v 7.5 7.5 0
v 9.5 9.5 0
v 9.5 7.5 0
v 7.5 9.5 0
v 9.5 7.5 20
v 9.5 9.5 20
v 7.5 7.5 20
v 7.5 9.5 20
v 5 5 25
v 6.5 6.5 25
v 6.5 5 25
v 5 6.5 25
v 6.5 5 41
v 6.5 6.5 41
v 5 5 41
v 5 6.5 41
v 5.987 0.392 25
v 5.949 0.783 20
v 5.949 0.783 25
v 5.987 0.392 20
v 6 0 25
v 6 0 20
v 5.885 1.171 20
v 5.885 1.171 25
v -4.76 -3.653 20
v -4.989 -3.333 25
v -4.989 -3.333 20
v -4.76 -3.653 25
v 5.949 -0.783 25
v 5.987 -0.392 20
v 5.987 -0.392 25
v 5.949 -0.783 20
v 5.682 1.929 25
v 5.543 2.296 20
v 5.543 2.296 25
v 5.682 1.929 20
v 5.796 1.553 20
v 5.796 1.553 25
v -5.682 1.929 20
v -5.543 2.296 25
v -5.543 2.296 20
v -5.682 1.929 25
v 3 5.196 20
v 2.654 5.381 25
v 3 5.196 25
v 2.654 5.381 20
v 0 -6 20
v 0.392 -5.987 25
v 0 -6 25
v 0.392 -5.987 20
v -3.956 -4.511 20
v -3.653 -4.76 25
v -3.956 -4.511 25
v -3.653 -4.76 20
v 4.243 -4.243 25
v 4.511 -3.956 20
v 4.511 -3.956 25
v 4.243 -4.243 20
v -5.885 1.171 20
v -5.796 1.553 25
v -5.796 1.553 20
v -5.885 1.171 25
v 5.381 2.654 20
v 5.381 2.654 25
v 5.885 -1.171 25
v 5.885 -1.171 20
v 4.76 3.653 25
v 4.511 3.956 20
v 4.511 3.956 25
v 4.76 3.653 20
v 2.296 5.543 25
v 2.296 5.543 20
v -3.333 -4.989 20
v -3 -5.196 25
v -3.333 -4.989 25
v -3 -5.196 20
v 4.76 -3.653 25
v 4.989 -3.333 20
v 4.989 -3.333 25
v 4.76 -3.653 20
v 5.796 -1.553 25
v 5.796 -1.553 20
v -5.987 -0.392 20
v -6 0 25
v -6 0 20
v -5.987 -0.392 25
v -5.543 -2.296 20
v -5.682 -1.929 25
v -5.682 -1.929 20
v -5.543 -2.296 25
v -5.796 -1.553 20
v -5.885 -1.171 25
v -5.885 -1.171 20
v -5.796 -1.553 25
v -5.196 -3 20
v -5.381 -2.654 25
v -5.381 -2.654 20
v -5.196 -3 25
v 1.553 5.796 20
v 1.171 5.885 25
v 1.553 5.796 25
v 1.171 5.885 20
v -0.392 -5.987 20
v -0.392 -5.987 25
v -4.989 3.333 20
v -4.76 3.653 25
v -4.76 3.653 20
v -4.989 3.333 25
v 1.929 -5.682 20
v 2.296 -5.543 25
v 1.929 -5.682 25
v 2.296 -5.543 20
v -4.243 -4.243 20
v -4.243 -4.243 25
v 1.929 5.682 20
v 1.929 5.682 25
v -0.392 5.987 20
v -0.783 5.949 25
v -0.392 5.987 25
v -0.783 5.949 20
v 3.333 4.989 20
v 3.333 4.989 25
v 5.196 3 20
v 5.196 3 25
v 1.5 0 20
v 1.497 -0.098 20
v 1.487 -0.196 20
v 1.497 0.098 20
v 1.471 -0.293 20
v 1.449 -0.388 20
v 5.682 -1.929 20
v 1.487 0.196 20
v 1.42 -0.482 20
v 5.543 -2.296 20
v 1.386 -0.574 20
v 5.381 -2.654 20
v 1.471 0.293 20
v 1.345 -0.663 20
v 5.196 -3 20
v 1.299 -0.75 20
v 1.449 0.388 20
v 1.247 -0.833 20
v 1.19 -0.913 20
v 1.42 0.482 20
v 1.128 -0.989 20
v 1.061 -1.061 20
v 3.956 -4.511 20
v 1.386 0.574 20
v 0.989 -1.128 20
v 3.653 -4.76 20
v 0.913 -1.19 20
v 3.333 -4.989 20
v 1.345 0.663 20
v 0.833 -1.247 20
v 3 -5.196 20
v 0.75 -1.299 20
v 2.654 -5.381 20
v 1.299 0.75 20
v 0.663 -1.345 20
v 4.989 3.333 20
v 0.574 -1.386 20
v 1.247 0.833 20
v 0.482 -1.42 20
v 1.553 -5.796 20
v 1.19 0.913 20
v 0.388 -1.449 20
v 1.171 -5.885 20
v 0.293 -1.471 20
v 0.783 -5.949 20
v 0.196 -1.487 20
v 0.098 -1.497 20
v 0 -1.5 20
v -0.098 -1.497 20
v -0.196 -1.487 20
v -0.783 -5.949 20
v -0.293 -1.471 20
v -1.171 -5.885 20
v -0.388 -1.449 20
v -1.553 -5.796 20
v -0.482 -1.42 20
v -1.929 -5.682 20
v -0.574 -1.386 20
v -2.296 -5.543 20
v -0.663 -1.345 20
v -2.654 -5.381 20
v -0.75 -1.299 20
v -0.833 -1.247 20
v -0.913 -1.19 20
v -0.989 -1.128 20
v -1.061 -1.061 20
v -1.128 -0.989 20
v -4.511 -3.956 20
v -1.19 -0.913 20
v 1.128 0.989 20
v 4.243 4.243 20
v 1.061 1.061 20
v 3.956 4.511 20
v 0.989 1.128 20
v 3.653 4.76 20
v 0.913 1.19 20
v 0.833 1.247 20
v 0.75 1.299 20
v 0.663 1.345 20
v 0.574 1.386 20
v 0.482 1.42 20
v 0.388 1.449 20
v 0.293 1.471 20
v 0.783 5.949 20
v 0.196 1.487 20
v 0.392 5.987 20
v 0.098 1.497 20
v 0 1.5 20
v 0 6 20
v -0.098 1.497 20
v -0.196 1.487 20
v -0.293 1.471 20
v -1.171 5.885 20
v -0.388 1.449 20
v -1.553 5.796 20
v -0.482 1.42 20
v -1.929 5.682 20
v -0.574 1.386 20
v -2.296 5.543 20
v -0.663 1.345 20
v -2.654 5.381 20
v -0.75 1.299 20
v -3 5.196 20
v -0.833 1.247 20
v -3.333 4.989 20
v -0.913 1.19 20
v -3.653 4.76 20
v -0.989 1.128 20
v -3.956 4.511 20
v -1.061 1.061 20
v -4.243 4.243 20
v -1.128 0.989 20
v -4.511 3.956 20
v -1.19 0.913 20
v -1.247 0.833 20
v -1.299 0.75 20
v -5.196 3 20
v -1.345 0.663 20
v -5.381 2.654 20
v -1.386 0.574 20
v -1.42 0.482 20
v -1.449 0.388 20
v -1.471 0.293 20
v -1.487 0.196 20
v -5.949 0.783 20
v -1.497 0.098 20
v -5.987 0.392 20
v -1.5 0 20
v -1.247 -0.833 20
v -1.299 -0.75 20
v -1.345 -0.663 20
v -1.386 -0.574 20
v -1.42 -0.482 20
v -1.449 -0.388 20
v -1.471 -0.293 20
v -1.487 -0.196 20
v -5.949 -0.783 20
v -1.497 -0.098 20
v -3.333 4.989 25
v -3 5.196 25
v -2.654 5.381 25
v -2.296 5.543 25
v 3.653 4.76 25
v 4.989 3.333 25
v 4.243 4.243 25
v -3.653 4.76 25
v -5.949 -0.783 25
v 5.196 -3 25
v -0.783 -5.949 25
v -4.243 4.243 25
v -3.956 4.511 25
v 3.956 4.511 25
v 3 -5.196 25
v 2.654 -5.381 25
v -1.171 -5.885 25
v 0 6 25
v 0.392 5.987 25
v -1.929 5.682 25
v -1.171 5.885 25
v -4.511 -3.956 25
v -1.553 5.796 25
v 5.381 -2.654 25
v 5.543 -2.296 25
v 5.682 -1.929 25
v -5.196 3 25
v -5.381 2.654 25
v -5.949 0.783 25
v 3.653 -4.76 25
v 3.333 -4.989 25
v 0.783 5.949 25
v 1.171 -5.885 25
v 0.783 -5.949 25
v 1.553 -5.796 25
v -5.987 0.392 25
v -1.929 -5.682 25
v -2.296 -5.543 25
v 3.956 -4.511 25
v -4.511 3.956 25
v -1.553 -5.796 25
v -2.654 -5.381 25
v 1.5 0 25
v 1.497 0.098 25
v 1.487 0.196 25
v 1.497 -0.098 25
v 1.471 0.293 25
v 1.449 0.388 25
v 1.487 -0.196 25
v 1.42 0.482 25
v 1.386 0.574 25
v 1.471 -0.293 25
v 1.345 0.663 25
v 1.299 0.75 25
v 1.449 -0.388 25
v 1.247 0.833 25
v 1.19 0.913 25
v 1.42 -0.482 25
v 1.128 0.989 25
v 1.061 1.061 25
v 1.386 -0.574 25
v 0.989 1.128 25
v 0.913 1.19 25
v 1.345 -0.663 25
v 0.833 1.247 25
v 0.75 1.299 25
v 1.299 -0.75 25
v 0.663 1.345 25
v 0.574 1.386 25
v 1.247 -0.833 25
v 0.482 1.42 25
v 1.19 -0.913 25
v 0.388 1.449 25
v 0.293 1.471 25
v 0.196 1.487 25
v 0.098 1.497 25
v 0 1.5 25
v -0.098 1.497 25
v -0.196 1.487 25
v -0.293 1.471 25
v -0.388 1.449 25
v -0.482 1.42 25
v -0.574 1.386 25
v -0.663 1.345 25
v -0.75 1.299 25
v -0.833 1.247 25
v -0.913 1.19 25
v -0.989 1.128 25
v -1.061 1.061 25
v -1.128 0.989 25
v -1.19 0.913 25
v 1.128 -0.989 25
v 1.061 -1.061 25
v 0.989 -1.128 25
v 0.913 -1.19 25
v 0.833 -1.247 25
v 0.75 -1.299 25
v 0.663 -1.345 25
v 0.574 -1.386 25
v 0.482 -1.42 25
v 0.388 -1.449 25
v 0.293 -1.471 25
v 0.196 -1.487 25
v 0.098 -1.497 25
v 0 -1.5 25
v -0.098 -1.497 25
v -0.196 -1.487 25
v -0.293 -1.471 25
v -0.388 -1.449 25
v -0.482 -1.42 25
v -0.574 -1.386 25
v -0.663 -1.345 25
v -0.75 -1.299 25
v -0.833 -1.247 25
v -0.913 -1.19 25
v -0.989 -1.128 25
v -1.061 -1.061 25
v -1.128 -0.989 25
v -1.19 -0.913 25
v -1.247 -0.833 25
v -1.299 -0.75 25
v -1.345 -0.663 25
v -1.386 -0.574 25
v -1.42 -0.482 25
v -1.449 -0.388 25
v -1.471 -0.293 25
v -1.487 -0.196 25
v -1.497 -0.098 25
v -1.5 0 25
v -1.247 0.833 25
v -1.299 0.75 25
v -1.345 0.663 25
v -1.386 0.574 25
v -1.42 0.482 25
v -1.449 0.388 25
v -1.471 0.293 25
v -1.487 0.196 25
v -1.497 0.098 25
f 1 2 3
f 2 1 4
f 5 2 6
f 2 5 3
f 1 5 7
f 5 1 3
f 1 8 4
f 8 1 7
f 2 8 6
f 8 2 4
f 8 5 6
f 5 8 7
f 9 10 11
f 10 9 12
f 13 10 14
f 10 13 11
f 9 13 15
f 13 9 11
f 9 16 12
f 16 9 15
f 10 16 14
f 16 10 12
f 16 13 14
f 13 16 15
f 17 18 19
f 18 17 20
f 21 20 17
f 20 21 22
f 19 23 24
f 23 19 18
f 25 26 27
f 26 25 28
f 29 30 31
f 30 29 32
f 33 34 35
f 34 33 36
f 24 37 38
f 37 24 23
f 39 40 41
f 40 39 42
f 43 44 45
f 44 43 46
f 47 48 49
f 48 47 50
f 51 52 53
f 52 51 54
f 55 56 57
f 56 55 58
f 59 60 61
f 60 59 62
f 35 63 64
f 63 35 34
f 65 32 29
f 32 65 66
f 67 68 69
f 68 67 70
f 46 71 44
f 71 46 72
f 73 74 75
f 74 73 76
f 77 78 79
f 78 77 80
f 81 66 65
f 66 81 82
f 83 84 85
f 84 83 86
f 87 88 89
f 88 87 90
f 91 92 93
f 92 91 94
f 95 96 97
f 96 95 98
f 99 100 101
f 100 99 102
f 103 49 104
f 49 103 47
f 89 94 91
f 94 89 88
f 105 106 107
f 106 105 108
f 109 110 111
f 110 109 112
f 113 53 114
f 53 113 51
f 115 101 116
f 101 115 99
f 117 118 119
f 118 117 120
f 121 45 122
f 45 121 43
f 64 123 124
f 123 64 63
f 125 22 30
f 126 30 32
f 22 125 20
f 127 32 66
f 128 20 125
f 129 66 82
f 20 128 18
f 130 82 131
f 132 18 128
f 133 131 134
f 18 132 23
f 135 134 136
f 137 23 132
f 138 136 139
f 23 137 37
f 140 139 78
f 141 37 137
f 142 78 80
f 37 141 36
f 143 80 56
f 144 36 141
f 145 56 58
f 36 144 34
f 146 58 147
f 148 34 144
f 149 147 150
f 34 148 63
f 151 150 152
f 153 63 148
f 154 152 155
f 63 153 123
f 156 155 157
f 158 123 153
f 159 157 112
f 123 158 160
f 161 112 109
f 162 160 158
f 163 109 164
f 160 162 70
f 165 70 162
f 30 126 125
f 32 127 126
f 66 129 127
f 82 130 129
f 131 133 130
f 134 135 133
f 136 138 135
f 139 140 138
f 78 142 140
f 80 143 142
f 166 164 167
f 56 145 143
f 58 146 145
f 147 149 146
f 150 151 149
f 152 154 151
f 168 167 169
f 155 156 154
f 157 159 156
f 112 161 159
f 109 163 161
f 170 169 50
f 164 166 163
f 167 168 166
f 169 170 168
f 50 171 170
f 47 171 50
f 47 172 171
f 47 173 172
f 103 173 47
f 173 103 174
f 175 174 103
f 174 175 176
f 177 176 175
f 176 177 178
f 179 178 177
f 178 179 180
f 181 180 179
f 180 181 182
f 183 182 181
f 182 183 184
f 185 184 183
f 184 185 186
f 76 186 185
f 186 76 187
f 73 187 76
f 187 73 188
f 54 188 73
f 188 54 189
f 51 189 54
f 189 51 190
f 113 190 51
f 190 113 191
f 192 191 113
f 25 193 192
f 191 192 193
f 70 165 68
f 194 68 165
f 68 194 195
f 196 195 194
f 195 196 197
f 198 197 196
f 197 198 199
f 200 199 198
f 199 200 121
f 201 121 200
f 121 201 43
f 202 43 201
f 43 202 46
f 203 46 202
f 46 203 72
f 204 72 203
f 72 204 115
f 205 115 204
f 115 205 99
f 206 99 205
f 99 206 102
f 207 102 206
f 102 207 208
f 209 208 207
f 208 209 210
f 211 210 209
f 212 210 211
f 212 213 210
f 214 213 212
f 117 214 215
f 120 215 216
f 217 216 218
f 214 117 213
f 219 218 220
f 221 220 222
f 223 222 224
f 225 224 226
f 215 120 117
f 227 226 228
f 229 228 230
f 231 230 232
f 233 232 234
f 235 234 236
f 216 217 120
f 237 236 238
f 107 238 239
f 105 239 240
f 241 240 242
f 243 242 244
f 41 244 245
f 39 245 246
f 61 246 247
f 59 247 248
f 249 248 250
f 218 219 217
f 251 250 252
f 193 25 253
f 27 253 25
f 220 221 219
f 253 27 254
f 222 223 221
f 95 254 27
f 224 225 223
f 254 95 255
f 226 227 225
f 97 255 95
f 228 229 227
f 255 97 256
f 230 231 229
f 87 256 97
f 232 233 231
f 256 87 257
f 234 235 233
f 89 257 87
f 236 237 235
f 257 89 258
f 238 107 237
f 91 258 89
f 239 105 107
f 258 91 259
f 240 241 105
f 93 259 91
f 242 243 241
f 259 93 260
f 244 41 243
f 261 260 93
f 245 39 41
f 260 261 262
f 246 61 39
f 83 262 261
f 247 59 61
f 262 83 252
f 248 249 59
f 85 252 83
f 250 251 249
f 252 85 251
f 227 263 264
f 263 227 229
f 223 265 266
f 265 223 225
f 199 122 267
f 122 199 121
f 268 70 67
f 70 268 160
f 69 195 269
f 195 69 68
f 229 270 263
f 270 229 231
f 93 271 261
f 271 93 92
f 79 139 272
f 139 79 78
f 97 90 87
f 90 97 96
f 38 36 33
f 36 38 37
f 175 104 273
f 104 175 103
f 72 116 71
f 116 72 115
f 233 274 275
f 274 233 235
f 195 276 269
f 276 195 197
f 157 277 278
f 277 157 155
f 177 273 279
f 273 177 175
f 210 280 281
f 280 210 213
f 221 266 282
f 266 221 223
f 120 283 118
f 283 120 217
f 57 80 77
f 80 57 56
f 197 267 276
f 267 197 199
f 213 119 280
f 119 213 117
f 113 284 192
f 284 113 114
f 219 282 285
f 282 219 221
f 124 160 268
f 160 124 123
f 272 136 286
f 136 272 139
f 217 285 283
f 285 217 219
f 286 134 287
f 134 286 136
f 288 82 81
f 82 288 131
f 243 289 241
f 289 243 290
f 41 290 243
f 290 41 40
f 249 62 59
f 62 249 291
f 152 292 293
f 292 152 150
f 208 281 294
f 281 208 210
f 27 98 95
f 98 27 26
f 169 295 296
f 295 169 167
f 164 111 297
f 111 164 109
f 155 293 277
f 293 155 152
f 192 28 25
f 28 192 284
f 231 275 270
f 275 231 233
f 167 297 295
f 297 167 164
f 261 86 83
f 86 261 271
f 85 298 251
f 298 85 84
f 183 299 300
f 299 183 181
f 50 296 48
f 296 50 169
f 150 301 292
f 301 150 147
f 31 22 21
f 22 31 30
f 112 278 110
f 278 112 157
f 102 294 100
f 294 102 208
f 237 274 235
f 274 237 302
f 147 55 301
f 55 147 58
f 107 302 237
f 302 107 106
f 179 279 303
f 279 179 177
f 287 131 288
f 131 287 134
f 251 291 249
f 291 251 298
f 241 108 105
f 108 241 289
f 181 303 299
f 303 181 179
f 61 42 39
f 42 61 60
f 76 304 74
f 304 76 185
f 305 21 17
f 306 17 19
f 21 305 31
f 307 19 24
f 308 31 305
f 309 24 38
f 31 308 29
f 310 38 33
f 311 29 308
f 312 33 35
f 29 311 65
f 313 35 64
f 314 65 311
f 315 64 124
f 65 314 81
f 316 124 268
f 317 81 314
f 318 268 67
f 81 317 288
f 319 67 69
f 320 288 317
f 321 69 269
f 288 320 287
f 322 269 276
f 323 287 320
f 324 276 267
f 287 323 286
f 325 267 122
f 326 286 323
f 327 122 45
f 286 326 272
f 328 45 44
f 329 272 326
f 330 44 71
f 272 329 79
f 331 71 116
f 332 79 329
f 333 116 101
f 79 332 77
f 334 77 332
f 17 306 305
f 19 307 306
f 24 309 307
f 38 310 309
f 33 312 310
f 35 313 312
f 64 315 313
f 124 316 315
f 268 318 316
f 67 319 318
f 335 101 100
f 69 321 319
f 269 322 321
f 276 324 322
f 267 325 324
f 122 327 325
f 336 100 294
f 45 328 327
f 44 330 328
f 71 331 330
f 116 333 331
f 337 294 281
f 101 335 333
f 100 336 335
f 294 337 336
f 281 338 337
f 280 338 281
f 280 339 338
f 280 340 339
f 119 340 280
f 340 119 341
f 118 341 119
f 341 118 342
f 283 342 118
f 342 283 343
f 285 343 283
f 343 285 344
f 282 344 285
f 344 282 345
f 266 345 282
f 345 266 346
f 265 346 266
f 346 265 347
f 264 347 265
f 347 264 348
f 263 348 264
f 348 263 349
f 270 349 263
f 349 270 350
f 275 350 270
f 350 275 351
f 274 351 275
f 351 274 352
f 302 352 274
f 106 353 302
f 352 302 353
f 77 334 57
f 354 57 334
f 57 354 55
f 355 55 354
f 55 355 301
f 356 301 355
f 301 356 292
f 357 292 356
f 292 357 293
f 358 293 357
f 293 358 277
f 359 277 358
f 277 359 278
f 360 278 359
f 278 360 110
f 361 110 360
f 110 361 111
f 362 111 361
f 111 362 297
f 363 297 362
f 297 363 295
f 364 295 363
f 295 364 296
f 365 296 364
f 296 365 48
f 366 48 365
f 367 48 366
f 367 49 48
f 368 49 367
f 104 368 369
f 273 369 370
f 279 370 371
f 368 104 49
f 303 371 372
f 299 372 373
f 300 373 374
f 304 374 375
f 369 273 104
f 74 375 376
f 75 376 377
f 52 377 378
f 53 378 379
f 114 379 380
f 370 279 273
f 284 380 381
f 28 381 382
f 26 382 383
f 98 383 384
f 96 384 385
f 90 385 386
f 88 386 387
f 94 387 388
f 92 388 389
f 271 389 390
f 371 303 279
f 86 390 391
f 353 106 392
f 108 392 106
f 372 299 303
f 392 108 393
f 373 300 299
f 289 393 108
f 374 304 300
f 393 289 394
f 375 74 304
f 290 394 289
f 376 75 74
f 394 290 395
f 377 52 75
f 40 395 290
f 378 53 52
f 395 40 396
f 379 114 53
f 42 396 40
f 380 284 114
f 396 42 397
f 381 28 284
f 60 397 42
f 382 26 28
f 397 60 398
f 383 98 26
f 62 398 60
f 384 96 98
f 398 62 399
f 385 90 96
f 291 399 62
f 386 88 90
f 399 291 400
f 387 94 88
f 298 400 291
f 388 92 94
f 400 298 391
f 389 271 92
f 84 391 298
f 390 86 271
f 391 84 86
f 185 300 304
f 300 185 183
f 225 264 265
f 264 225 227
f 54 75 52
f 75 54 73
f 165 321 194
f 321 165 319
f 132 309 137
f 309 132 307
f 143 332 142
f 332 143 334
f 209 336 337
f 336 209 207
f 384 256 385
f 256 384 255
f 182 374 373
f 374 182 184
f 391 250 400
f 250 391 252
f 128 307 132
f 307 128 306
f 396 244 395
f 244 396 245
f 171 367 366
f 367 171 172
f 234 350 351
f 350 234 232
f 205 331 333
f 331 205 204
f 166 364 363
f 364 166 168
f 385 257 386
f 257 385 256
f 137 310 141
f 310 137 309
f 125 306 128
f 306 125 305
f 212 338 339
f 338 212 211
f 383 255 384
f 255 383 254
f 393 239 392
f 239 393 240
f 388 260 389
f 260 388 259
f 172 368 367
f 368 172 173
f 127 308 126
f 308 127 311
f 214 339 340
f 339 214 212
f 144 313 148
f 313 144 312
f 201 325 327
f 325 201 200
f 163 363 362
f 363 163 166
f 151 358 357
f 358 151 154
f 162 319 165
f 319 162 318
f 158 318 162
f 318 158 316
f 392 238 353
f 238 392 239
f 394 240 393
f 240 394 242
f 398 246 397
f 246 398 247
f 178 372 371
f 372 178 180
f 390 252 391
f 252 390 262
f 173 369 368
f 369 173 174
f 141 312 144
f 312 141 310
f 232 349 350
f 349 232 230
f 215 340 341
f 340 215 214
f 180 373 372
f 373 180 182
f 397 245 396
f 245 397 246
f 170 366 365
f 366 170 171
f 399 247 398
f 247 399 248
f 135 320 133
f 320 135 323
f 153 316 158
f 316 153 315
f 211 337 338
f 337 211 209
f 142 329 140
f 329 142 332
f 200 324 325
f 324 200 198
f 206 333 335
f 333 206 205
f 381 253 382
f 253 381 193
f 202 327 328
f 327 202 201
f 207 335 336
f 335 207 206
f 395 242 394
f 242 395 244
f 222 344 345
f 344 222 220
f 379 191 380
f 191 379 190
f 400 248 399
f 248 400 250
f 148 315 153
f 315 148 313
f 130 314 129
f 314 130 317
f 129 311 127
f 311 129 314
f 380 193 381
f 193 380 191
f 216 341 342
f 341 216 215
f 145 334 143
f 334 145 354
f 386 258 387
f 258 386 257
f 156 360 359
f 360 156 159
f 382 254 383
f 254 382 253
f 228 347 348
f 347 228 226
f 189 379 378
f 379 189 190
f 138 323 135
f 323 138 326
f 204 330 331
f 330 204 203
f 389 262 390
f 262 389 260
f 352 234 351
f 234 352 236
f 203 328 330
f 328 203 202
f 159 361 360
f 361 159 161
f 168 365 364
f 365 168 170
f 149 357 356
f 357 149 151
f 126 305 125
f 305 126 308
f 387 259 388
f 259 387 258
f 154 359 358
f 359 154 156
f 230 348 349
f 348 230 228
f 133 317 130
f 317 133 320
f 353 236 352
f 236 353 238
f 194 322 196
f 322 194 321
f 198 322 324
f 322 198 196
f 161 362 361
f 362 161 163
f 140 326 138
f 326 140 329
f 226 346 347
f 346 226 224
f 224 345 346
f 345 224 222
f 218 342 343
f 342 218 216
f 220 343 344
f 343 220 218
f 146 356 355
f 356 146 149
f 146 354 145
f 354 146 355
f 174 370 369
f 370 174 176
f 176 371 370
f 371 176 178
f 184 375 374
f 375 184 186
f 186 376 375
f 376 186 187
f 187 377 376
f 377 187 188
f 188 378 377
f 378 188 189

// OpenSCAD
// Straight hose-barb reducer: 8 mm tubing to 5 mm tubing
// Print orientation: upright along Z, resting on XY plane at z = 0

$fn = 96;

// ---- Dimensions (mm) ----
collar_d      = 12;    // collar outer diameter
bore_d        = 3;     // through-bore diameter
barb_8_bottom = 7.5;   // 8 mm barb OD at bottom
barb_8_top    = 9.5;   // 8 mm barb OD at top
barb_5_bottom = 6.5;   // 5 mm barb OD at bottom
barb_5_top    = 5.0;   // 5 mm barb OD at top
eps           = 0.5;   // cutter overshoot

// ---- Model ----
difference() {
    union() {
        // 8 mm barbs, stacked
        for (z = [0, 10])
            translate([0, 0, z])
                linear_extrude(height = 10)
                    polygon(points = [[barb_8_bottom, barb_8_bottom],
                                       [barb_8_top, barb_8_bottom],
                                       [barb_8_top, barb_8_top],
                                       [barb_8_bottom, barb_8_top]]);
        // collar
        translate([0, 0, 20])
            cylinder(d = collar_d, h = 5);
        // 5 mm barbs, stacked
        for (z = [25, 33])
            translate([0, 0, z])
                linear_extrude(height = 8)
                    polygon(points = [[barb_5_bottom, barb_5_bottom],
                                       [barb_5_top, barb_5_bottom],
                                       [barb_5_top, barb_5_top],
                                       [barb_5_bottom, barb_5_top]]);
    }
    // through-bore, full length
    translate([0, 0, -eps])
        cylinder(d = bore_d, h = 41 + 2 * eps);
}
